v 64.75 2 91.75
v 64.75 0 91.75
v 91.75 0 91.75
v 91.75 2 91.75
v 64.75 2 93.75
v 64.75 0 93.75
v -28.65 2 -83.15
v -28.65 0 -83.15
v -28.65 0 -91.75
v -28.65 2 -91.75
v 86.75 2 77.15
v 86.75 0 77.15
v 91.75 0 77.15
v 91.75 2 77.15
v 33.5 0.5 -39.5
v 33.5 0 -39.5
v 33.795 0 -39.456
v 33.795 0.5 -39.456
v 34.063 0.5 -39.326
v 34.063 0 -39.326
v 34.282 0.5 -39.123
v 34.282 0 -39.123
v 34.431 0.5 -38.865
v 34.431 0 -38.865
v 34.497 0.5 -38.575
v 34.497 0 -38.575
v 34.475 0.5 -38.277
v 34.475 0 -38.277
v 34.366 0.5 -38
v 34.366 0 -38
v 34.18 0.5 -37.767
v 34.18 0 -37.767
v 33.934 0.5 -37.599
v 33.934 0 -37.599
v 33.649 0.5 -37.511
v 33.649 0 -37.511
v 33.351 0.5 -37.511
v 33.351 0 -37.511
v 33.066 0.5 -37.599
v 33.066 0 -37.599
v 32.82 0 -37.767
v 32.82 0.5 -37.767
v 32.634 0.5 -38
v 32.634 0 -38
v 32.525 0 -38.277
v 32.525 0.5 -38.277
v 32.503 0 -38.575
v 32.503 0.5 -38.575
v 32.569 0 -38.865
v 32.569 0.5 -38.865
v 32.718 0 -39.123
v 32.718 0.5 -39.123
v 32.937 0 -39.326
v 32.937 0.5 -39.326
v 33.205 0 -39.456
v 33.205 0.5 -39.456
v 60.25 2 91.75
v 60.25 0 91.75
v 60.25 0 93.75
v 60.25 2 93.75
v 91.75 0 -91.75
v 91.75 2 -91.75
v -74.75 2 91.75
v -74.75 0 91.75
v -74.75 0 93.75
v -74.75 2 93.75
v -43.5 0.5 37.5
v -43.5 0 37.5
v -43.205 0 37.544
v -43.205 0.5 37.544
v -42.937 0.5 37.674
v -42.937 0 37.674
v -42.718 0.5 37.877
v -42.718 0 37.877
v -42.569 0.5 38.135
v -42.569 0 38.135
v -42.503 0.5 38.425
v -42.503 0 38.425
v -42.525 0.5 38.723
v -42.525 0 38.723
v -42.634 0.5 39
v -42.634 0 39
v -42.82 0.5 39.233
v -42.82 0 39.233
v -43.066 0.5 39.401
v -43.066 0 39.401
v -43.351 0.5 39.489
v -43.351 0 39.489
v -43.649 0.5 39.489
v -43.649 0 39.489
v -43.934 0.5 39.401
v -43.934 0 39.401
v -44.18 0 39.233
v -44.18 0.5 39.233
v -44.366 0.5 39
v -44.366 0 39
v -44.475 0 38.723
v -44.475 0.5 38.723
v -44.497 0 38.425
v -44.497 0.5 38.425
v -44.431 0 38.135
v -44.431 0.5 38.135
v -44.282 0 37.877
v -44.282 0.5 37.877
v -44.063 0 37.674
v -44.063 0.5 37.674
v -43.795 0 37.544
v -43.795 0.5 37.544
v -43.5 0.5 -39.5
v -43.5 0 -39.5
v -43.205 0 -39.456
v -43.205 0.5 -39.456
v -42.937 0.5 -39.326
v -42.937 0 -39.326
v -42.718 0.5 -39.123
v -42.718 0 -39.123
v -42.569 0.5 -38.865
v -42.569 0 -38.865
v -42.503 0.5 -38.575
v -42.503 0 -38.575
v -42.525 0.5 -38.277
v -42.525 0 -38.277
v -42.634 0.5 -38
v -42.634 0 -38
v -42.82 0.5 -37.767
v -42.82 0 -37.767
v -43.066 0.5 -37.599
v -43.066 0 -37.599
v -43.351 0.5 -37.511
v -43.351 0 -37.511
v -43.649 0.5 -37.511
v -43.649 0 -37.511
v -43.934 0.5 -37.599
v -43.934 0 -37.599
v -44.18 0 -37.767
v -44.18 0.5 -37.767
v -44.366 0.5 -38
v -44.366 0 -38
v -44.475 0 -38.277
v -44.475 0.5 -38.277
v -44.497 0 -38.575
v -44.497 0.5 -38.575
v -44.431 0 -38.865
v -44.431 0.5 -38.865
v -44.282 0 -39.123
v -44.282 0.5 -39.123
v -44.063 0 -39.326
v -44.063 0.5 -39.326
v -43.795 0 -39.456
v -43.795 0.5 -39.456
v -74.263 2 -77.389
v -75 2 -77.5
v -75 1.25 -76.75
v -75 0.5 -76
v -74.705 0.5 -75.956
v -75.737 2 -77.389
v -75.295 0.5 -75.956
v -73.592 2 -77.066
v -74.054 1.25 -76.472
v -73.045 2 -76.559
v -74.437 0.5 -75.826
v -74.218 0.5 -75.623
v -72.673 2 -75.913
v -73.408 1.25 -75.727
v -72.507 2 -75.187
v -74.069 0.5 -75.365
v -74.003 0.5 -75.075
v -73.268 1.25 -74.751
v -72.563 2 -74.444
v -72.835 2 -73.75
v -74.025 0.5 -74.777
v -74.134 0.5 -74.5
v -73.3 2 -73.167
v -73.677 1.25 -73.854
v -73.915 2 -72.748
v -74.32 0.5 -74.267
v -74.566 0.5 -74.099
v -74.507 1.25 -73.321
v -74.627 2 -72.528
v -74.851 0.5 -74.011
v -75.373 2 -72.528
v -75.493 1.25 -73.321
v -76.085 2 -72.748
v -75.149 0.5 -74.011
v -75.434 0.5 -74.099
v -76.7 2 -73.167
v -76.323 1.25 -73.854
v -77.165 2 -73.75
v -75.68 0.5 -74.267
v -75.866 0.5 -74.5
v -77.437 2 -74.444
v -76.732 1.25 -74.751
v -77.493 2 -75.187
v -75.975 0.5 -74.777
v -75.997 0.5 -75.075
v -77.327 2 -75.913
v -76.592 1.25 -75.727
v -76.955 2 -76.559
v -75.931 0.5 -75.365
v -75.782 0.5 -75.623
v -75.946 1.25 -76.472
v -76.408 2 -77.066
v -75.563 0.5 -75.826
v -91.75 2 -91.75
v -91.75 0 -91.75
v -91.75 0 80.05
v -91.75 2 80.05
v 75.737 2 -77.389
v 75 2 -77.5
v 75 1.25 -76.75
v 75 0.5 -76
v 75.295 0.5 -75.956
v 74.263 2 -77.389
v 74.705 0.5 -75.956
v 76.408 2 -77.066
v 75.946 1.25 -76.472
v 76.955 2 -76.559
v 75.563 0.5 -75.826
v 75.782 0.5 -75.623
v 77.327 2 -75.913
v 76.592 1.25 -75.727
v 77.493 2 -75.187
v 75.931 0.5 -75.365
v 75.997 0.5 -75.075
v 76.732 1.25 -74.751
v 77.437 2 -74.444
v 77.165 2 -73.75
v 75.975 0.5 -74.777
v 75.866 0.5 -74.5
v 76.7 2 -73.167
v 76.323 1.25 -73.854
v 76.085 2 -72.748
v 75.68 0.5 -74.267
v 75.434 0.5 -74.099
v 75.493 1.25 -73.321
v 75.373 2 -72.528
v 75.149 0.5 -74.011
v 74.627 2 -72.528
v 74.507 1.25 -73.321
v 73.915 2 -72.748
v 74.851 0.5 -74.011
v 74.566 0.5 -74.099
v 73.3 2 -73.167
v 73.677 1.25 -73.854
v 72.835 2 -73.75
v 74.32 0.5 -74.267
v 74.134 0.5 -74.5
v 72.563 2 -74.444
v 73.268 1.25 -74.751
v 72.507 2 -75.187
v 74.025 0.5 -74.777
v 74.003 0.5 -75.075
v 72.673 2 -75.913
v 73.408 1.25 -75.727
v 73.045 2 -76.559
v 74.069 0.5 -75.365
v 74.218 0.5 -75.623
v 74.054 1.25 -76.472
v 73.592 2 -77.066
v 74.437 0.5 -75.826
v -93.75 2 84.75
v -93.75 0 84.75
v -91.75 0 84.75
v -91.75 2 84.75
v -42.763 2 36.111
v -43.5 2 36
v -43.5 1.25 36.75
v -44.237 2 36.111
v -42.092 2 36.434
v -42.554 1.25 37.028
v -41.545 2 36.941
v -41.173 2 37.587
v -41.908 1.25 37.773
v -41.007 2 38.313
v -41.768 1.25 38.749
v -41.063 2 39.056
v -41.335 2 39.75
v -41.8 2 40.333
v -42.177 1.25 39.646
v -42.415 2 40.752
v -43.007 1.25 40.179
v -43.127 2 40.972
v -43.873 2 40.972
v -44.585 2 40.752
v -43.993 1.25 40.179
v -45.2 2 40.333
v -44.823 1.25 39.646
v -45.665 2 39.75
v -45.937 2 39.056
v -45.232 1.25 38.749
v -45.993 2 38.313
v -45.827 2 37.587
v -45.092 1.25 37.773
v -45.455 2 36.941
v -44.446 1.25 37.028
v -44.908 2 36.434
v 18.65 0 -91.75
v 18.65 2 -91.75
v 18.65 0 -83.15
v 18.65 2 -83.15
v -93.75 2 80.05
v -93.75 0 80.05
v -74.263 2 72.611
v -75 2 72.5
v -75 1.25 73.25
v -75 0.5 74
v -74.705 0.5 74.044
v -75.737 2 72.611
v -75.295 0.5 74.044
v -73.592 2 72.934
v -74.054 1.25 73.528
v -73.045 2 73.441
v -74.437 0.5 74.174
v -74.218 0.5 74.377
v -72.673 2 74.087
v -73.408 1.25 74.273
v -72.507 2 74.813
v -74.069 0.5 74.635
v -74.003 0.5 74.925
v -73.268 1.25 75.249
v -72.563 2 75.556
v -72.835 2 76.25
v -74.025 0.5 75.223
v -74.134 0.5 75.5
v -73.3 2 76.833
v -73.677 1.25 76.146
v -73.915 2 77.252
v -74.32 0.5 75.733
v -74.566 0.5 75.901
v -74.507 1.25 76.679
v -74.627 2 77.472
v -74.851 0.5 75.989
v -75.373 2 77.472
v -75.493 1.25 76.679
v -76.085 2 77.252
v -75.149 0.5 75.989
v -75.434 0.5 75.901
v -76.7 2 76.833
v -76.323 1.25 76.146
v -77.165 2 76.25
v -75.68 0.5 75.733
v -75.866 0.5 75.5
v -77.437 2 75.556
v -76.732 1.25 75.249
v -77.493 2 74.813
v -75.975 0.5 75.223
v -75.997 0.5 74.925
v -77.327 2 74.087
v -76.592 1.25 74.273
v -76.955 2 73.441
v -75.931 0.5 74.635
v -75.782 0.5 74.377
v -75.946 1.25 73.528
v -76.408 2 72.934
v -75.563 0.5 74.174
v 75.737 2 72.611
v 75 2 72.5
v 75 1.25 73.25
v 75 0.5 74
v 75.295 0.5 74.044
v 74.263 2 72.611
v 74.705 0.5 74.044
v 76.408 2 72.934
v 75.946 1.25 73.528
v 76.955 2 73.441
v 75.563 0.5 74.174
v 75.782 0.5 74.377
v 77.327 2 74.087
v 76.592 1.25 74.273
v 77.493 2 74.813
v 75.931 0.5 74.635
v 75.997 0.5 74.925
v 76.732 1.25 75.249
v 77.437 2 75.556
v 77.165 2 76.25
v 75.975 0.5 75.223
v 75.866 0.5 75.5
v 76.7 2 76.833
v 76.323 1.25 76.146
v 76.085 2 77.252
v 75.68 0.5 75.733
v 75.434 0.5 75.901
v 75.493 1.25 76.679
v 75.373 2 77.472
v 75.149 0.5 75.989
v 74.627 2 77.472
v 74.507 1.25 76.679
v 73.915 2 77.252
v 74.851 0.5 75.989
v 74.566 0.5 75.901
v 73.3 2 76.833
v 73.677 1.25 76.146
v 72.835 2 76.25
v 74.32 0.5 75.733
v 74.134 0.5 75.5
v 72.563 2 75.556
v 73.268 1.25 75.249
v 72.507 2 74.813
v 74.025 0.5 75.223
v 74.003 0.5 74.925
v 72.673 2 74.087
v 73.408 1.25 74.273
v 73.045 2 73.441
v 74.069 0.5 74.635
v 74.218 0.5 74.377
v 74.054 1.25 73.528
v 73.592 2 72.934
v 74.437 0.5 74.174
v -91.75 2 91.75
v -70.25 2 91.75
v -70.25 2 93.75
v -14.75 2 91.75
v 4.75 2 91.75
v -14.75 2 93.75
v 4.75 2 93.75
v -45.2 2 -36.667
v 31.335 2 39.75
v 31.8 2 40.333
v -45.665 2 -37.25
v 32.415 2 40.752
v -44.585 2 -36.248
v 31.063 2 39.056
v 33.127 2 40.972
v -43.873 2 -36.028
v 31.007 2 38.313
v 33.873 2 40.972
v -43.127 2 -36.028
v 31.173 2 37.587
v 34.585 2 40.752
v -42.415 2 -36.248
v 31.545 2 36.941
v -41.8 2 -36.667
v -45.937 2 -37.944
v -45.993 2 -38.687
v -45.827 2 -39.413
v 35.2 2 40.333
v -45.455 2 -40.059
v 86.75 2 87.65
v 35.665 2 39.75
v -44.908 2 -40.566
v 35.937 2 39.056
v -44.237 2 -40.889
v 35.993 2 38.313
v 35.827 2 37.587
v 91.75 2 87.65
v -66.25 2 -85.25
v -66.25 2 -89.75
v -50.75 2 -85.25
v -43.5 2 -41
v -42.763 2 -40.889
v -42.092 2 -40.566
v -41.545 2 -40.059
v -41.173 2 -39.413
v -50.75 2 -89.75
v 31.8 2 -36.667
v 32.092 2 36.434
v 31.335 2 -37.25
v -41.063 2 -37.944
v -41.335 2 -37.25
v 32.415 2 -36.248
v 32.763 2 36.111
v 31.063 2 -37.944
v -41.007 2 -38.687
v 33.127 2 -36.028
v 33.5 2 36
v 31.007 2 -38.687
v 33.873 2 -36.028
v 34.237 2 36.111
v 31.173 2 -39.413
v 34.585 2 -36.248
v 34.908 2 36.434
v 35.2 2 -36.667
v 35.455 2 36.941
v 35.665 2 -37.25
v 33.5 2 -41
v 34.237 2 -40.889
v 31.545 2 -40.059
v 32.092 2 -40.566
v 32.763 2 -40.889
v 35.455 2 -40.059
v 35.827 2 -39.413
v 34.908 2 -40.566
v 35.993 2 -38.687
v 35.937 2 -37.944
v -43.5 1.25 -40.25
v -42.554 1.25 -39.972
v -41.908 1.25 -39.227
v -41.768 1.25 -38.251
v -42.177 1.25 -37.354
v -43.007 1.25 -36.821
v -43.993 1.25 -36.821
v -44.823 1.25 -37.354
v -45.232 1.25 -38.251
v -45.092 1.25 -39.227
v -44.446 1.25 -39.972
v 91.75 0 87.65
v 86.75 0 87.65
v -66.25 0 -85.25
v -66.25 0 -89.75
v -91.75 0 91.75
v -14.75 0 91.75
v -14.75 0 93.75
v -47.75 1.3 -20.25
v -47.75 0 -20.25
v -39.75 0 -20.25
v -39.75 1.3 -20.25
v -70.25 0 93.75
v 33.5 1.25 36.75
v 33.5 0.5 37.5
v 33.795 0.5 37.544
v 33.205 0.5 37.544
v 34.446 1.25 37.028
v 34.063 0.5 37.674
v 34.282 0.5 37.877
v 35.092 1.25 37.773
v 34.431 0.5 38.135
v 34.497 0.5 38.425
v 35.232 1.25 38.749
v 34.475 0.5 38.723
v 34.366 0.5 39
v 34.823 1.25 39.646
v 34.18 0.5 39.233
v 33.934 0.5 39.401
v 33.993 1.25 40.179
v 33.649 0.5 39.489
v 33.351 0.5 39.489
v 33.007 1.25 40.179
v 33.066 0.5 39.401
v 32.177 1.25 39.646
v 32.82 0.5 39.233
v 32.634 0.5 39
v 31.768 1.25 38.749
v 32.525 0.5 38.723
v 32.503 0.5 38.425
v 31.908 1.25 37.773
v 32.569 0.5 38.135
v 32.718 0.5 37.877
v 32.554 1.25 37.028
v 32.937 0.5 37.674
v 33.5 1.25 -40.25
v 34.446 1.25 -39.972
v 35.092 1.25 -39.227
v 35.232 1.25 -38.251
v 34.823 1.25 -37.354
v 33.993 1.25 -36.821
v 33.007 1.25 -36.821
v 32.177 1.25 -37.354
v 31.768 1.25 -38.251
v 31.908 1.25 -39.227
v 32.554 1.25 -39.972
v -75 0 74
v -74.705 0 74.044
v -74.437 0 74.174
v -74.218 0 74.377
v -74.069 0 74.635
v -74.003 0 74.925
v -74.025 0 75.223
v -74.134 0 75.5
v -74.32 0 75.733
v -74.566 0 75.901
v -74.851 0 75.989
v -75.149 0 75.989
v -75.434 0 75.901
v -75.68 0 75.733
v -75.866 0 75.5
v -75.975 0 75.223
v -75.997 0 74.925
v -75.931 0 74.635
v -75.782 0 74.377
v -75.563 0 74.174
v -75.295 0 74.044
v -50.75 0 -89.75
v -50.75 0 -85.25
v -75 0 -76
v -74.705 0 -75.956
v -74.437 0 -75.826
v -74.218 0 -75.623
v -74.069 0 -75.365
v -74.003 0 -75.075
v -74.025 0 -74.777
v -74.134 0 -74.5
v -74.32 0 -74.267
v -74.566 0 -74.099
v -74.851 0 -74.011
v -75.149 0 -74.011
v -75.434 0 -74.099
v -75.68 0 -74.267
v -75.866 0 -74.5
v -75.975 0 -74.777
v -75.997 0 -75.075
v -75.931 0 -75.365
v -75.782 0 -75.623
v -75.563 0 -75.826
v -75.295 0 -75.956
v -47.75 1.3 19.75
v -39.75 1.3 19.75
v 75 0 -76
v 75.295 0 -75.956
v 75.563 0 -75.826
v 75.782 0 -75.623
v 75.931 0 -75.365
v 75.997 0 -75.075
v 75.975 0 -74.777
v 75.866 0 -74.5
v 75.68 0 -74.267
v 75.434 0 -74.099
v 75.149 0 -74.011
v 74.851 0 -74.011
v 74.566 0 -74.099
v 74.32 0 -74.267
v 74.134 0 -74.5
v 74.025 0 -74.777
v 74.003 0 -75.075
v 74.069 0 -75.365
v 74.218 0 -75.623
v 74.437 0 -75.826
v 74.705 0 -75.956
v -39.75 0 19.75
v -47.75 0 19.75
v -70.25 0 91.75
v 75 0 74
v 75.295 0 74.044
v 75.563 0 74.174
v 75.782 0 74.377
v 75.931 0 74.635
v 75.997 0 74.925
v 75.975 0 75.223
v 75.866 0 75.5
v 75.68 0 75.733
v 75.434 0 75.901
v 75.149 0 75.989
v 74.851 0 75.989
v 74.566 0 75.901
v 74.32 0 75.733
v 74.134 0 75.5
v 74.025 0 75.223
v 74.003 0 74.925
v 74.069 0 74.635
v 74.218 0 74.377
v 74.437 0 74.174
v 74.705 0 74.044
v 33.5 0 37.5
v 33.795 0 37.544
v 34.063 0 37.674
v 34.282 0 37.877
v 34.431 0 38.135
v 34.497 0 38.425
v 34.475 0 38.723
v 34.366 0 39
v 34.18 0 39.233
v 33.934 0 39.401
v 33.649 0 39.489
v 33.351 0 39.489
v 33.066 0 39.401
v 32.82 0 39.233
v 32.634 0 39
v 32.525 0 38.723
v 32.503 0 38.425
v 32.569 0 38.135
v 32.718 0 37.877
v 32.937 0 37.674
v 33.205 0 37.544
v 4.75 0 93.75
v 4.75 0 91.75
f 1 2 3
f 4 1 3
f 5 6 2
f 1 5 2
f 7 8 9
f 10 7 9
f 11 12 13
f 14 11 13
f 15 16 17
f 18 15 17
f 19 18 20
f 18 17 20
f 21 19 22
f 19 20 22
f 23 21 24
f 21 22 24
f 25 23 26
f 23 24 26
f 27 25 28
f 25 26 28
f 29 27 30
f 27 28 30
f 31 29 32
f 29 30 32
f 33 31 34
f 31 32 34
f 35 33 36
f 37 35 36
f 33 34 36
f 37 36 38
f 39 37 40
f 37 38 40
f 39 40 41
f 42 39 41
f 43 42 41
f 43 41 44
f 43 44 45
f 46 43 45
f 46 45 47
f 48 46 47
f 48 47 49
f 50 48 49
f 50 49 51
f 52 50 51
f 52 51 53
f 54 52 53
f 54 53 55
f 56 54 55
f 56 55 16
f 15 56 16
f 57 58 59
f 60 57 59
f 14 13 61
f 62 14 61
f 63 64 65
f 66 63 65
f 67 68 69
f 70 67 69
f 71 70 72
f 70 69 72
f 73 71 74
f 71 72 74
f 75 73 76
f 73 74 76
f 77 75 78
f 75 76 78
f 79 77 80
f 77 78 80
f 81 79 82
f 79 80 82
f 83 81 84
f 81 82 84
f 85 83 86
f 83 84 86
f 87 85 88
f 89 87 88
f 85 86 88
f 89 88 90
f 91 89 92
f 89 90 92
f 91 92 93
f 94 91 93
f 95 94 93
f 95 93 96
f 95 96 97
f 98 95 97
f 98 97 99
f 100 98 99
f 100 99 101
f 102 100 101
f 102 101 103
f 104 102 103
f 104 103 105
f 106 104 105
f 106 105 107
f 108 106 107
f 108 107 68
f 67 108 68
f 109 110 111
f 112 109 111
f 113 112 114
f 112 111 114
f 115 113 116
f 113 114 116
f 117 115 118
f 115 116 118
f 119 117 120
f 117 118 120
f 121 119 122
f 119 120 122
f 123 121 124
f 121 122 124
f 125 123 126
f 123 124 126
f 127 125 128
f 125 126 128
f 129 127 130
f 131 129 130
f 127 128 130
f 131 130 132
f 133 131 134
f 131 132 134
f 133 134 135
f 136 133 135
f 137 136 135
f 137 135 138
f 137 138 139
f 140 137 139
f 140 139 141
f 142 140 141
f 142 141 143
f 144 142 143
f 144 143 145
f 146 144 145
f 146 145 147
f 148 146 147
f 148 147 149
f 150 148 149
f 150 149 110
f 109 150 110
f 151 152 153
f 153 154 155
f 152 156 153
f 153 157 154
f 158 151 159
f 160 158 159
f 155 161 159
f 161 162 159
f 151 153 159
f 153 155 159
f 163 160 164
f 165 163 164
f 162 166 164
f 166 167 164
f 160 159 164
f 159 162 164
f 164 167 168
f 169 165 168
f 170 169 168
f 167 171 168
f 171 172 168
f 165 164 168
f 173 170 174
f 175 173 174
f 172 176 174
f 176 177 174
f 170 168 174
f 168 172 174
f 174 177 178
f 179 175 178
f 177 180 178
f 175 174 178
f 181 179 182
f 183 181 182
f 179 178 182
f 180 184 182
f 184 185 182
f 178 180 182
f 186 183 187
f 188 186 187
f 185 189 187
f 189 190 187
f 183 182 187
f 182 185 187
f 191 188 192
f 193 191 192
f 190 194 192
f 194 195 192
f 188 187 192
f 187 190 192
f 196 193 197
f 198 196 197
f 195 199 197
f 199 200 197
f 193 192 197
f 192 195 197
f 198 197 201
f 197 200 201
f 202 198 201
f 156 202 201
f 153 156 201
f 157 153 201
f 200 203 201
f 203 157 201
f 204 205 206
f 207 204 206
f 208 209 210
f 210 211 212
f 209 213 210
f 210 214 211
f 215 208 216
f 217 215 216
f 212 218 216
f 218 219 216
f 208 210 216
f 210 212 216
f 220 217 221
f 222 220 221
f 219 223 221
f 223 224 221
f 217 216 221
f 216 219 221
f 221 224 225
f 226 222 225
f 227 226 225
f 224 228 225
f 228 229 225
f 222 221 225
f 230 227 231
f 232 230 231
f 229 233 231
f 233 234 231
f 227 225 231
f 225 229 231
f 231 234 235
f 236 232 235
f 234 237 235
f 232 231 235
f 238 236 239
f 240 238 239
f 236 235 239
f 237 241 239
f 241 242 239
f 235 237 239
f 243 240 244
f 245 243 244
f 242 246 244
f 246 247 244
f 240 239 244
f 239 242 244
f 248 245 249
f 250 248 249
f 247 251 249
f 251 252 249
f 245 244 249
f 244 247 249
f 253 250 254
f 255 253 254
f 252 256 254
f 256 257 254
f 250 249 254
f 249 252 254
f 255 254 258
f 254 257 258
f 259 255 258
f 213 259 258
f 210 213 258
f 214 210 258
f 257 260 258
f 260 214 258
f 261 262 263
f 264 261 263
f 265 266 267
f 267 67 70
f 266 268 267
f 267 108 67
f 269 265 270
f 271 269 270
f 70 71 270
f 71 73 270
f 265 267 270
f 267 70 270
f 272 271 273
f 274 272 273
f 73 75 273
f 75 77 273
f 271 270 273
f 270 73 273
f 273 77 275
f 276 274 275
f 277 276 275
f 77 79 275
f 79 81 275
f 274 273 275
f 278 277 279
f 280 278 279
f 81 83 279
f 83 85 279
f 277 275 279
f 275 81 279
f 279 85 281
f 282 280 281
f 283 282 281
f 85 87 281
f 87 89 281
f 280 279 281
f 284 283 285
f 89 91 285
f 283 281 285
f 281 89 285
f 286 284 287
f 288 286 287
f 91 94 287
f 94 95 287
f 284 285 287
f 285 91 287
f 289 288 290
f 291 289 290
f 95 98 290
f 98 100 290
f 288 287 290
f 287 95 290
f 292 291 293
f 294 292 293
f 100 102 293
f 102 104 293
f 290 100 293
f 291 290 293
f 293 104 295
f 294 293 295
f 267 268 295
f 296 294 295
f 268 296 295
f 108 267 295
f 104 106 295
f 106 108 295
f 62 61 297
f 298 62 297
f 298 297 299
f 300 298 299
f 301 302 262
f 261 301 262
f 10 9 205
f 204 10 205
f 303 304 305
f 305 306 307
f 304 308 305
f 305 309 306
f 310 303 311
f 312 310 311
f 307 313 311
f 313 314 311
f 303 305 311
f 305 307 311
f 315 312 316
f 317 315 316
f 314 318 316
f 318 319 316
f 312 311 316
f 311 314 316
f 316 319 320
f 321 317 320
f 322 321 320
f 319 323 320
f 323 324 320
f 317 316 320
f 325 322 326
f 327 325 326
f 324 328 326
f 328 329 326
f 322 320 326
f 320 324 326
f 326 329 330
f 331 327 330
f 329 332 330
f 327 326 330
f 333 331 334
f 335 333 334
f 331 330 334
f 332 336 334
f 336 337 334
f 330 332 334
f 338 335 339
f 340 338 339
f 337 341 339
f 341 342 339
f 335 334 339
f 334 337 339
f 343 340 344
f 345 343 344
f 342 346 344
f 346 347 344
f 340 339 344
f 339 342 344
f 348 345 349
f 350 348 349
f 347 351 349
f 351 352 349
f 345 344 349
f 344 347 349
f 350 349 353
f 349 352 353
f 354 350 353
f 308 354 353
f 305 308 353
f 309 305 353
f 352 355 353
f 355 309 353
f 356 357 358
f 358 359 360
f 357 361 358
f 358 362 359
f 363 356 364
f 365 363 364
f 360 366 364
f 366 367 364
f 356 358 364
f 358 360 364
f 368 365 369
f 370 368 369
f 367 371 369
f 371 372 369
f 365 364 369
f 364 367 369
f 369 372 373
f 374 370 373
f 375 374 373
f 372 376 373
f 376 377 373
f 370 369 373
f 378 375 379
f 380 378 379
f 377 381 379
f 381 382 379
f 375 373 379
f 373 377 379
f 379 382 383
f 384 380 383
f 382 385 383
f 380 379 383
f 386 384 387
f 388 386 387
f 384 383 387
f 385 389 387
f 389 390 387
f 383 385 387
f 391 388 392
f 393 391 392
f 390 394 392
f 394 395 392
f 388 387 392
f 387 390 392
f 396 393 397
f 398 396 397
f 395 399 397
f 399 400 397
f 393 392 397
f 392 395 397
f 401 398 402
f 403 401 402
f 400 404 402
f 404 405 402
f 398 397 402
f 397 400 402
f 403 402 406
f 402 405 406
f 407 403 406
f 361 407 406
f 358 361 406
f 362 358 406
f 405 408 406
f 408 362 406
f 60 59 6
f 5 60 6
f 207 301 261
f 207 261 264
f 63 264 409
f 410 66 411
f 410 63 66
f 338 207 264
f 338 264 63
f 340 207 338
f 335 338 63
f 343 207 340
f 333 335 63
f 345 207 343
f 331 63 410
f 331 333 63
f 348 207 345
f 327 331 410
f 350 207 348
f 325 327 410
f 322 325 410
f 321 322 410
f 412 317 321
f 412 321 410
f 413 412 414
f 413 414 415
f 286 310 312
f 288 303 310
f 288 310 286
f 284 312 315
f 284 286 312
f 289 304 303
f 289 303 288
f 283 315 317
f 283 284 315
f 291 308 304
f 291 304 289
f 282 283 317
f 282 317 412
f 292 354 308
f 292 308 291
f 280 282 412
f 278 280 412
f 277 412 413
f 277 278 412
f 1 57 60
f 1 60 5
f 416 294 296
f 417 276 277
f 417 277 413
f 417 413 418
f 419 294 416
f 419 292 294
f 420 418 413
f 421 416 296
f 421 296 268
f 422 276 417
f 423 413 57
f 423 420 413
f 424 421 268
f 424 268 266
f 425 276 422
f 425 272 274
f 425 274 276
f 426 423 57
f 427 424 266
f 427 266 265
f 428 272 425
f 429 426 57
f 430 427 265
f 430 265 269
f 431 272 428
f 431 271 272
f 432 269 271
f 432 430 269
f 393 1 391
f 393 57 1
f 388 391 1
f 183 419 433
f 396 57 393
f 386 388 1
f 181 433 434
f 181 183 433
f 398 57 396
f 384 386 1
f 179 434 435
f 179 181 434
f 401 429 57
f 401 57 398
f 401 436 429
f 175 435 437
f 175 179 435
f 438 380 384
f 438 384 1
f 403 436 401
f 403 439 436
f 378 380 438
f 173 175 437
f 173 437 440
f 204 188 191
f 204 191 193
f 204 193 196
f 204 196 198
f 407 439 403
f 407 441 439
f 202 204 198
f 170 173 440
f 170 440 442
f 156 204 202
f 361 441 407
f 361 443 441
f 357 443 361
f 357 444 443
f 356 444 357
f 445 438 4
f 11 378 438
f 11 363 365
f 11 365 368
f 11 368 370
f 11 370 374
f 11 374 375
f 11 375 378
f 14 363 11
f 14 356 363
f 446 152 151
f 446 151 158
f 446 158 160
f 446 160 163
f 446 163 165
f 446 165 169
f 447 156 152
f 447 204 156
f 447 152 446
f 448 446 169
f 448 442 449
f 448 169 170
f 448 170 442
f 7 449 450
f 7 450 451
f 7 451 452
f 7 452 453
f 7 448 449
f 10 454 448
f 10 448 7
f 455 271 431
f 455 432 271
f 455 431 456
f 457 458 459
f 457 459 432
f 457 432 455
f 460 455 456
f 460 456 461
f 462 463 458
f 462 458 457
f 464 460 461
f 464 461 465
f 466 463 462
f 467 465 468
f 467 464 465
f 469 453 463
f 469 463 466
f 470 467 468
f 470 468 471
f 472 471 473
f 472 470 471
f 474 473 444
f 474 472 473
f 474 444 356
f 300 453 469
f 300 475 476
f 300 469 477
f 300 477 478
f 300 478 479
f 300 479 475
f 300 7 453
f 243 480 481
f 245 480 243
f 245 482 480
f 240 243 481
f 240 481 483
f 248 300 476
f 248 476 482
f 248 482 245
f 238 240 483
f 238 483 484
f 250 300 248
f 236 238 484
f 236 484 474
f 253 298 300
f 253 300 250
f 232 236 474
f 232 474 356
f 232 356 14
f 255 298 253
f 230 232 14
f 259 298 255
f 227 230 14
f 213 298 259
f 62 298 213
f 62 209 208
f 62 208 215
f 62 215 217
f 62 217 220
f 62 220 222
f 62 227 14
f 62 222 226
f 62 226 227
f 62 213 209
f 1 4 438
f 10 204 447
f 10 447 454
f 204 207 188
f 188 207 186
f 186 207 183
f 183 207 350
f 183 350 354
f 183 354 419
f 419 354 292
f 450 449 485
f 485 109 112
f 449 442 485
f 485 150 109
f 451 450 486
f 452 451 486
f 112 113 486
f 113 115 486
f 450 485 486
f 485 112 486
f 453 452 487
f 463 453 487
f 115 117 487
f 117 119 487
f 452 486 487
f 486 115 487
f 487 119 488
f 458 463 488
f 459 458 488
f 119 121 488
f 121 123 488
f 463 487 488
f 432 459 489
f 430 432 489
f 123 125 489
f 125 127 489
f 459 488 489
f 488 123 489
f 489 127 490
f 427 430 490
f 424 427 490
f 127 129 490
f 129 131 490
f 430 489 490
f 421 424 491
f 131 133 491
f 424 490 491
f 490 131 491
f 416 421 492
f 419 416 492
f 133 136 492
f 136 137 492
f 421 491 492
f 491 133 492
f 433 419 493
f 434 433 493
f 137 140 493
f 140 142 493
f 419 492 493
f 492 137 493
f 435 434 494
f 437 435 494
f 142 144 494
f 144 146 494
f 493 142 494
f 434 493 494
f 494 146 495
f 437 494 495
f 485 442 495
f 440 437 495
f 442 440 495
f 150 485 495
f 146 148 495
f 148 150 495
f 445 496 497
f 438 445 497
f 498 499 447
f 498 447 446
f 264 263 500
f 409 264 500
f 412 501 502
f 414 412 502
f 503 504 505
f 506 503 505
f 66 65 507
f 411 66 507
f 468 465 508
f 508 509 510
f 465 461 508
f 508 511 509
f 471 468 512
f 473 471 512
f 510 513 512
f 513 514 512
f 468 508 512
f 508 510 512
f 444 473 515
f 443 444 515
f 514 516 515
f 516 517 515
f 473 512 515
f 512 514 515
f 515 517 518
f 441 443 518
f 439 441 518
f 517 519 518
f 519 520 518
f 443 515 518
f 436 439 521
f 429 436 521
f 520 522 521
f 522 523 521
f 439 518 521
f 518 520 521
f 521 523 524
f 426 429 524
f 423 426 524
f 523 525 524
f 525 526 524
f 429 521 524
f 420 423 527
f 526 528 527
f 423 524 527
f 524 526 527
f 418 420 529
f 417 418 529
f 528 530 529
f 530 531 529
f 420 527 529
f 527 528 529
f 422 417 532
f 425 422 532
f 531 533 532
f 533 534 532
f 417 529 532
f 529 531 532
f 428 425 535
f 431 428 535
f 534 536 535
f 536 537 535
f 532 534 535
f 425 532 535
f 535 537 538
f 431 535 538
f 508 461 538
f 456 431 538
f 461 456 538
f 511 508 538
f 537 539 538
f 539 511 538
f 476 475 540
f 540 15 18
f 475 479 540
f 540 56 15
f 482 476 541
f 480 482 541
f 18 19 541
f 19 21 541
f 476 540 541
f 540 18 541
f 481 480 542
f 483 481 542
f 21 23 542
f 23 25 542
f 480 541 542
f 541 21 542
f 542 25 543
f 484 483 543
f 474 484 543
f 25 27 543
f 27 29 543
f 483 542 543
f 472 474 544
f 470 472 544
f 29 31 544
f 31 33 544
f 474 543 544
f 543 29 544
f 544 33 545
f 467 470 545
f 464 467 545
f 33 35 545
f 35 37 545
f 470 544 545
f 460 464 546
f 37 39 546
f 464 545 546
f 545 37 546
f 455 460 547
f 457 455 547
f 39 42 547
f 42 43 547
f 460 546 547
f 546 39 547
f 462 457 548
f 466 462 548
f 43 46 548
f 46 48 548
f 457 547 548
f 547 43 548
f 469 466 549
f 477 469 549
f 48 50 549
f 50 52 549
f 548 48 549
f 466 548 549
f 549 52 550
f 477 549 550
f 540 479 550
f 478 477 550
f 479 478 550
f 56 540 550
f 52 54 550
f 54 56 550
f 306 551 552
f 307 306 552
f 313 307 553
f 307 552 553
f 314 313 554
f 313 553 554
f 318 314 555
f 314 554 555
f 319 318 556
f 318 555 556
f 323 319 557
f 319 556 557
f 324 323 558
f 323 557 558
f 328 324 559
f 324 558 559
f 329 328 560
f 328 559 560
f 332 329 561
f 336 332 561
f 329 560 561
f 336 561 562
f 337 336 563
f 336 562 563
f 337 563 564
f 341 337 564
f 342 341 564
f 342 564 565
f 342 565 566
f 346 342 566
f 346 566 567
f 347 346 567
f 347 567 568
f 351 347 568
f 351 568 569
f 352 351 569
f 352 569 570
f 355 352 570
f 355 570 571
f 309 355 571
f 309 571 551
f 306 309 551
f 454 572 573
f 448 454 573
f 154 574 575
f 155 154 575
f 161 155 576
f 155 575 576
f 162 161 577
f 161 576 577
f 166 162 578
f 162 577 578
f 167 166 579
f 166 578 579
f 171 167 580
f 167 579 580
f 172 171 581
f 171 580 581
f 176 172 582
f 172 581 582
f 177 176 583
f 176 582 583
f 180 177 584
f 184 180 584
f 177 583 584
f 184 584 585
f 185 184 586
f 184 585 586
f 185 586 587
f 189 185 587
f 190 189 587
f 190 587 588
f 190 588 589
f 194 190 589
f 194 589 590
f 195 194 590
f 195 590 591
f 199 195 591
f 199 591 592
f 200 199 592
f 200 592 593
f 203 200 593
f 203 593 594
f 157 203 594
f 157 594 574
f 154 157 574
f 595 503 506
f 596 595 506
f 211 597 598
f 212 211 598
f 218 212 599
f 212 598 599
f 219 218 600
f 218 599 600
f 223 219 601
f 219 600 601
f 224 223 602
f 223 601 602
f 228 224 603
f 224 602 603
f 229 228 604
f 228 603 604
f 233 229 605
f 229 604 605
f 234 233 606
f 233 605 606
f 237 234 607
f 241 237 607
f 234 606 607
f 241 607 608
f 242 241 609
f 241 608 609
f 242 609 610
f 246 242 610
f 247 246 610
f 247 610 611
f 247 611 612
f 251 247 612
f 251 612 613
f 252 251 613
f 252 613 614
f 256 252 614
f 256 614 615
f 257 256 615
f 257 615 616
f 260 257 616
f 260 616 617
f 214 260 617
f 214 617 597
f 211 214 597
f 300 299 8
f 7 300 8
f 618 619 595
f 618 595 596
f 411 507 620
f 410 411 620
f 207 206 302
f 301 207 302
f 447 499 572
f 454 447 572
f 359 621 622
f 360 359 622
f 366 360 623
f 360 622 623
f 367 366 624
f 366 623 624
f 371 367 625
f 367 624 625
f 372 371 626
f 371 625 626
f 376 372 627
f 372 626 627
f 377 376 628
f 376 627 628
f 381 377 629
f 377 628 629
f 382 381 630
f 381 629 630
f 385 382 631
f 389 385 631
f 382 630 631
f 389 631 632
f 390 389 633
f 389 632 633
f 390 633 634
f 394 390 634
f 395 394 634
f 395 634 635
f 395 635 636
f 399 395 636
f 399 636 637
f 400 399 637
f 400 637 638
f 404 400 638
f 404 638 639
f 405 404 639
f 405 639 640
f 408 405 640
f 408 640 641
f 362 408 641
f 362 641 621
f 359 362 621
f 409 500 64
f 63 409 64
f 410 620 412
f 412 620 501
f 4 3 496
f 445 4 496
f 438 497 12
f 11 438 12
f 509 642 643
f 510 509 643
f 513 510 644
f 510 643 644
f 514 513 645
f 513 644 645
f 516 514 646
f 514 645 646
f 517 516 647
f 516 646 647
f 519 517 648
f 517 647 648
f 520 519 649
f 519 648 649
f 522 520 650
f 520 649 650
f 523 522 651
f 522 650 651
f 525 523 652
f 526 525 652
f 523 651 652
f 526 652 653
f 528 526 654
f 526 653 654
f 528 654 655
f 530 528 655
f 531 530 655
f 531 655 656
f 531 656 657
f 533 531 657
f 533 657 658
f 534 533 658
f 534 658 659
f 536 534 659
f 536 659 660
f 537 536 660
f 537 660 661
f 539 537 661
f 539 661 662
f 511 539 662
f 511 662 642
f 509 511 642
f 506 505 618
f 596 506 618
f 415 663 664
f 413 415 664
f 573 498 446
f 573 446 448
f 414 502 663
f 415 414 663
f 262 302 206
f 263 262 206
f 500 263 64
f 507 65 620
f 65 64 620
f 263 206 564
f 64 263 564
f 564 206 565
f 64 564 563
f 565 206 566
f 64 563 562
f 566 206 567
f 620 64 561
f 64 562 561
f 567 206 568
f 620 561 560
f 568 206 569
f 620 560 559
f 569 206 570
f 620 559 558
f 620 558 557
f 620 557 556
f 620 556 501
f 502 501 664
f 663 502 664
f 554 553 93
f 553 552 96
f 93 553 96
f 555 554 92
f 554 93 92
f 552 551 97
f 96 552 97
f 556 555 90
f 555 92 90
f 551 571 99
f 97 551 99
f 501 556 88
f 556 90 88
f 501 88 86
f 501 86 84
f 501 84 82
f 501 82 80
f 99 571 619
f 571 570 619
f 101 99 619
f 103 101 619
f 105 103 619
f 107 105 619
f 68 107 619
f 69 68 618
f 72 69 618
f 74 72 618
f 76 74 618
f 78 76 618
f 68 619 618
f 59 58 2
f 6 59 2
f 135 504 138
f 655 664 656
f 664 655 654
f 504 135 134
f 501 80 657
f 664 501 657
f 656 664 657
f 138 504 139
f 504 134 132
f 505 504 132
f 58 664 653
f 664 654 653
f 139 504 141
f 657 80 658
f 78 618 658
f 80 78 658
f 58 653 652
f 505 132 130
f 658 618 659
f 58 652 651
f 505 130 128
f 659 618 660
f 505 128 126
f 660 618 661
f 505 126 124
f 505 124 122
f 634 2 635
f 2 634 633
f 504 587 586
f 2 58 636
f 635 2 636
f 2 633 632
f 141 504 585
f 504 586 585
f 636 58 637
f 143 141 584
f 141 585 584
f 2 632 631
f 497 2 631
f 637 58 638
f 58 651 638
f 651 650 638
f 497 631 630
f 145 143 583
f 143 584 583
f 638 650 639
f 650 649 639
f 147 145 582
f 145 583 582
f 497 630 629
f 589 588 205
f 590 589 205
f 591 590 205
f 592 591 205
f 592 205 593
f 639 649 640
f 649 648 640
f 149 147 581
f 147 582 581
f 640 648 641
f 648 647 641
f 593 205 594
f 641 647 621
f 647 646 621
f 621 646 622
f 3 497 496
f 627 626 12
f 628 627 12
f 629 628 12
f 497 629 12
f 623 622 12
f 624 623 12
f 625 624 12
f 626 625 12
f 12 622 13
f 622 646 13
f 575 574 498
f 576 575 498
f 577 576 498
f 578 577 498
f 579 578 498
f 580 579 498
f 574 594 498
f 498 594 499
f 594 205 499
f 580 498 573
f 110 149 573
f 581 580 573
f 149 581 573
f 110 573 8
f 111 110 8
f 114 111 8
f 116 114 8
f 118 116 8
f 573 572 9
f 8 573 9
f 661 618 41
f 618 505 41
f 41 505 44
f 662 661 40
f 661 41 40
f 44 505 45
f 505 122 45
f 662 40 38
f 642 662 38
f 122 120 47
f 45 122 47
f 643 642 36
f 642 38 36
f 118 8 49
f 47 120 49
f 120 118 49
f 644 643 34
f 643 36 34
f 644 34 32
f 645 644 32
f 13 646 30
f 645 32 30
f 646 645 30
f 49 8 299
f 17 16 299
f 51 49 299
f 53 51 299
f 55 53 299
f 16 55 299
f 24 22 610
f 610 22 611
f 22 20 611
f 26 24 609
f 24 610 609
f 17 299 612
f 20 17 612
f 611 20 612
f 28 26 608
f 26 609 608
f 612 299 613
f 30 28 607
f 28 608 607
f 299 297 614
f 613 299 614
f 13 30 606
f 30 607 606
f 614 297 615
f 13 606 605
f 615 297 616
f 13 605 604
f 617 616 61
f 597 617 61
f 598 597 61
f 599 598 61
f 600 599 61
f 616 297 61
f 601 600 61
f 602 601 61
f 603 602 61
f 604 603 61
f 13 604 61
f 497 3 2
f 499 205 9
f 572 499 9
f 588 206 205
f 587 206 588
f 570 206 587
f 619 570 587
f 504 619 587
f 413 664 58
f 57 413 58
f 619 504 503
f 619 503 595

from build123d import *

# Parameters (mm, degrees)
BOSS_EXTRUDE1_DEPTH = 2
SKETCH2_R           = 1
CUT_EXTRUDE1_DEPTH  = 133.597605559
CHAMFER1_SIZE       = 1.5
SKETCH3_W           = 15.5
SKETCH3_H           = 4.5
CUT_EXTRUDE2_DEPTH  = 133.597605559
SKETCH4_W           = 8
SKETCH4_H           = 40
CUT_EXTRUDE3_DEPTH  = 1.3


with BuildPart() as part:
    # Sketch1 → Boss-Extrude1 (new body)
    with BuildSketch(Plane(origin=(0, 0, 0), x_dir=(1, 0, 0), z_dir=(0, 1, 0))):
        Polygon((-74.75, -93.75), (-70.25, -93.75), (-70.25, -91.75), (-14.75, -91.75), (-14.75, -93.75), (4.75, -93.75), (4.75, -91.75), (60.25, -91.75), (60.25, -93.75), (64.75, -93.75), (64.75, -91.75), (91.75, -91.75), (91.75, -87.65), (86.75, -87.65), (86.75, -77.15), (91.75, -77.15), (91.75, 91.75), (18.65, 91.75), (18.65, 83.15), (-28.65, 83.15), (-28.65, 91.75), (-91.75, 91.75), (-91.75, -80.05), (-93.75, -80.05), (-93.75, -84.75), (-91.75, -84.75), (-91.75, -91.75), (-74.75, -91.75), align=None)
    extrude(amount=BOSS_EXTRUDE1_DEPTH)

    # Sketch2 → Cut-Extrude1 (cut, through all)
    with BuildSketch(Plane.XZ):
        with Locations(Location((75, -75, 0), (0, 0, 270))):
            Circle(SKETCH2_R)
        with Locations(Location((-75, -75, 0), (0, 0, 270))):
            Circle(SKETCH2_R)
        with Locations(Location((-75, 75, 0), (0, 0, 270))):
            Circle(SKETCH2_R)
        with Locations(Location((75, 75, 0), (0, 0, 270))):
            Circle(SKETCH2_R)
        with Locations(Location((33.5, 38.5, 0), (0, 0, 270))):
            Circle(SKETCH2_R)
        with Locations(Location((-43.5, 38.5, 0), (0, 0, 270))):
            Circle(SKETCH2_R)
        with Locations(Location((-43.5, -38.5, 0), (0, 0, 270))):
            Circle(SKETCH2_R)
        with Locations(Location((33.5, -38.5, 0), (0, 0, 270))):
            Circle(SKETCH2_R)
    extrude(amount=-CUT_EXTRUDE1_DEPTH, mode=Mode.SUBTRACT)

    # Chamfer1
    chamfer1_edges = [part.edges().sort_by_distance(p)[0] for p in [
        (-75, 2, -74),
        (-75, 2, 76),
        (75, 2, 76),
        (33.5, 2, 39.5),
        (-43.5, 2, 39.5),
        (-43.5, 2, -37.5),
        (33.5, 2, -37.5),
        (75, 2, -74),
    ]]
    chamfer(chamfer1_edges, length=CHAMFER1_SIZE)

    # Sketch3 → Cut-Extrude2 (cut, through all)
    with BuildSketch(Plane.XZ):
        with Locations((-58.5, -87.5)):
            Rectangle(SKETCH3_W, SKETCH3_H)
    extrude(amount=-CUT_EXTRUDE2_DEPTH, mode=Mode.SUBTRACT)

    # Sketch4 → Cut-Extrude3 (cut)
    with BuildSketch(Plane.XZ):
        with Locations((-43.75, -0.25)):
            Rectangle(SKETCH4_W, SKETCH4_H)
    extrude(amount=-CUT_EXTRUDE3_DEPTH, mode=Mode.SUBTRACT)


solid = part.part
